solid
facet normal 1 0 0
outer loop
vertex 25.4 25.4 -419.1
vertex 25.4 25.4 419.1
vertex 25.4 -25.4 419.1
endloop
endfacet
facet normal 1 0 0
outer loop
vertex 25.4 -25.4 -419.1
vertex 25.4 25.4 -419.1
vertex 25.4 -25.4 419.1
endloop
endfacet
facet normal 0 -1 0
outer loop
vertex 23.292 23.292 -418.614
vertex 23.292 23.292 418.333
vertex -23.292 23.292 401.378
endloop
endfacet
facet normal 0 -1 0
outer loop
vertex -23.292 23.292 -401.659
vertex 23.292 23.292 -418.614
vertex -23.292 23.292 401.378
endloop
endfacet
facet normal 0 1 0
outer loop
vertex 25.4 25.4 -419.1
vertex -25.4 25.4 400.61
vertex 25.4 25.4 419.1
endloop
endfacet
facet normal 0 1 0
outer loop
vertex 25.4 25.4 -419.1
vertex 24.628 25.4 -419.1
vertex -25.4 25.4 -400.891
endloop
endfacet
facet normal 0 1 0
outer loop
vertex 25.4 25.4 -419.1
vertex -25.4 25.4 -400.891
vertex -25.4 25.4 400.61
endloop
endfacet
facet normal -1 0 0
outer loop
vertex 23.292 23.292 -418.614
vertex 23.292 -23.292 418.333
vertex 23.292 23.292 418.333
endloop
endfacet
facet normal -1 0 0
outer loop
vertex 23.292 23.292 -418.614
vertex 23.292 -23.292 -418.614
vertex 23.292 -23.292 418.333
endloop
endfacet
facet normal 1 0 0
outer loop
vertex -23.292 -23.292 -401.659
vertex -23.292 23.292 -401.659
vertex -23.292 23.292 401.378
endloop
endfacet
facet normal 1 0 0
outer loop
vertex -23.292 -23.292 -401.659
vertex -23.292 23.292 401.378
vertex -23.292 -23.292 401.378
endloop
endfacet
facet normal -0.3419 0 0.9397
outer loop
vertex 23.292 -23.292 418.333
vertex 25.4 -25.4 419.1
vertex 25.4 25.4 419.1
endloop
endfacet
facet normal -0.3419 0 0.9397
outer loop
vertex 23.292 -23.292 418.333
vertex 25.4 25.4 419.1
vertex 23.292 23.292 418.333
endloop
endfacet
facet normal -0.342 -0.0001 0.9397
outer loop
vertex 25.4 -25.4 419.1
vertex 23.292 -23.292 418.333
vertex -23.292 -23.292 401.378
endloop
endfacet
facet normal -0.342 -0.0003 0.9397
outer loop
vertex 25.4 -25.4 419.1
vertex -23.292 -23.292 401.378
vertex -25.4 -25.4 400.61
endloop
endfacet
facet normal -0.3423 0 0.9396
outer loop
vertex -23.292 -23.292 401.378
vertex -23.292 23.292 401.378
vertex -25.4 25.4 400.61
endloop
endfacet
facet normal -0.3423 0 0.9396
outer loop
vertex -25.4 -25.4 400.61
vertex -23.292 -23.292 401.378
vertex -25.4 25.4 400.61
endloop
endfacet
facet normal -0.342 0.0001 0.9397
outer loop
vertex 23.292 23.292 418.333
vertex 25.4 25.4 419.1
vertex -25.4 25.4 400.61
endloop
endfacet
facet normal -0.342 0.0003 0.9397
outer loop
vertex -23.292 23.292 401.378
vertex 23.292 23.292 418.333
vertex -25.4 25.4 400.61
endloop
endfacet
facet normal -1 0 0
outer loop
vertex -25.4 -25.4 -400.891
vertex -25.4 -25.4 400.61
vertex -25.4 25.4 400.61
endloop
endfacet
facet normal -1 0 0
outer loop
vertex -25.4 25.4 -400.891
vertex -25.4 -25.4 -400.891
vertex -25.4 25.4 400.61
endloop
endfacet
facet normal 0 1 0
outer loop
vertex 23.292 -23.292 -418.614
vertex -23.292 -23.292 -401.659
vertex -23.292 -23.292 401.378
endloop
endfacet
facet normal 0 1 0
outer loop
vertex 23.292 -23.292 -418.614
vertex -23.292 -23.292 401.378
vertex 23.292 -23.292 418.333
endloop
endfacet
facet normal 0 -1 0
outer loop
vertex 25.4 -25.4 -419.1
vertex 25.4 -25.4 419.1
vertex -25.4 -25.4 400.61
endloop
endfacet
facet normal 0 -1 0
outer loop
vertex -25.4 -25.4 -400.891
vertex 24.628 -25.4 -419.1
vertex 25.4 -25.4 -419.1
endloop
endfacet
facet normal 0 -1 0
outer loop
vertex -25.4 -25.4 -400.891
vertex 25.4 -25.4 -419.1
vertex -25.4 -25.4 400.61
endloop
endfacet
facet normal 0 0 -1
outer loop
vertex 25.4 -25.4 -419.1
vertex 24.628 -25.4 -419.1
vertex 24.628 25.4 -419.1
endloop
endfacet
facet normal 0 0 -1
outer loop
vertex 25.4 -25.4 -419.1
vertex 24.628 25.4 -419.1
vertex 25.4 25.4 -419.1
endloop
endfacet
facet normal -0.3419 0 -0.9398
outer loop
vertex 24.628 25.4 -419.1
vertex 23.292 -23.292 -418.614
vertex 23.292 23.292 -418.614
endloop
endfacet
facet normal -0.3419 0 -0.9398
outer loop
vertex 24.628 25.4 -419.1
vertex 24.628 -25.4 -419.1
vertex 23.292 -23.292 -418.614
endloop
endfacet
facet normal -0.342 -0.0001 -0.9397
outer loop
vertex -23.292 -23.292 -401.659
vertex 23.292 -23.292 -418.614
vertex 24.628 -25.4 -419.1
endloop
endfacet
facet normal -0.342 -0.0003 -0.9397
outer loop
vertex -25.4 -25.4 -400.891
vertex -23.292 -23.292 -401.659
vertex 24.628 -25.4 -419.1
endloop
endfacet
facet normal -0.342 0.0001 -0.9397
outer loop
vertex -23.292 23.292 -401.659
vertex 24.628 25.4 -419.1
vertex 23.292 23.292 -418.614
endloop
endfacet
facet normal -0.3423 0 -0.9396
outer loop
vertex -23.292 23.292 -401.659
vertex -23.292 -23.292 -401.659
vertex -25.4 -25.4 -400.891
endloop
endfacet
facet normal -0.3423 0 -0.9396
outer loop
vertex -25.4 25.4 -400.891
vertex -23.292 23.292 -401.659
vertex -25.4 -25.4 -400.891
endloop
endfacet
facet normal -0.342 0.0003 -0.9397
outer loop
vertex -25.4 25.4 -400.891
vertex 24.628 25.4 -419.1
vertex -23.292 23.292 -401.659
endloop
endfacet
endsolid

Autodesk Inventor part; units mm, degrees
ref_plane "YZ Plane" through (0, 0, 0) normal (1, 0, 0) x (0, 1, 0)
ref_plane "XZ Plane" through (0, 0, 0) normal (0, 1, 0) x (-1, 0, 0)
ref_plane "XY Plane" through (0, 0, 0) normal (0, 0, 1) x (1, 0, 0)
sketch "Sketch1" plane through (0, 0, 0) normal (0, 0, 1) x (1, 0, 0)
  line L0 (-25.4, 25.4) -> (25.4, 25.4)
  line L1 (25.4, 25.4) -> (25.4, -25.4)
  line L2 (25.4, -25.4) -> (-25.4, -25.4)
  line L3 (-25.4, -25.4) -> (-25.4, 25.4)
  line L4 (23.2918, 23.2918) -> (-23.2918, 23.2918)
  line L5 (-23.2918, 23.2918) -> (-23.2918, -23.2918)
  line L6 (-23.2918, -23.2918) -> (23.2918, -23.2918)
  line L7 (23.2918, -23.2918) -> (23.2918, 23.2918)
  point P0 (0, 0)
  point P1 (0, 25.4)
  point P2 (23.2918, 0)
  dimension "d0" = 50.8
  dimension "d1" = 50.8
  dimension "d2" = 2.1082
extrude "Extrusion1" add sketch "Sketch1" along normal mid plane 838.2
sketch "Sketch2" plane through (-25.4, 25.4, 419.1) normal (0, 1, 0) x (1, 0, 0)
  line L0 (50.8, 0) -> (109.4588, 0) construction
  line L1 (50.0284, 838.2) -> (109.4588, 838.2) construction
  line L2 (50.8, 0) -> (0, 18.4897)
  line L3 (50.8, 0) -> (104.8602, 0) construction
  line L4 (0, 18.4897) -> (0, 0)
  line L5 (0, 0) -> (50.8, 0)
  line L6 (50.0284, 838.2) -> (109.4588, 838.2) construction
  line L7 (0, 838.2) -> (50.0284, 838.2)
  line L8 (0, 838.2) -> (0, 0) projected
  line L9 (50.0284, 838.2) -> (0, 819.9912)
  line L10 (50.0284, 838.2) -> (103.2675, 838.2) construction
  line L11 (0, 819.9912) -> (0, 838.2)
  point P0 (25.4, 419.1)
  dimension "d7" = 160
  dimension "d11" = 160
extrude "Extrusion2" cut sketch "Sketch2" against normal through all
properties part number "TV mount center"
